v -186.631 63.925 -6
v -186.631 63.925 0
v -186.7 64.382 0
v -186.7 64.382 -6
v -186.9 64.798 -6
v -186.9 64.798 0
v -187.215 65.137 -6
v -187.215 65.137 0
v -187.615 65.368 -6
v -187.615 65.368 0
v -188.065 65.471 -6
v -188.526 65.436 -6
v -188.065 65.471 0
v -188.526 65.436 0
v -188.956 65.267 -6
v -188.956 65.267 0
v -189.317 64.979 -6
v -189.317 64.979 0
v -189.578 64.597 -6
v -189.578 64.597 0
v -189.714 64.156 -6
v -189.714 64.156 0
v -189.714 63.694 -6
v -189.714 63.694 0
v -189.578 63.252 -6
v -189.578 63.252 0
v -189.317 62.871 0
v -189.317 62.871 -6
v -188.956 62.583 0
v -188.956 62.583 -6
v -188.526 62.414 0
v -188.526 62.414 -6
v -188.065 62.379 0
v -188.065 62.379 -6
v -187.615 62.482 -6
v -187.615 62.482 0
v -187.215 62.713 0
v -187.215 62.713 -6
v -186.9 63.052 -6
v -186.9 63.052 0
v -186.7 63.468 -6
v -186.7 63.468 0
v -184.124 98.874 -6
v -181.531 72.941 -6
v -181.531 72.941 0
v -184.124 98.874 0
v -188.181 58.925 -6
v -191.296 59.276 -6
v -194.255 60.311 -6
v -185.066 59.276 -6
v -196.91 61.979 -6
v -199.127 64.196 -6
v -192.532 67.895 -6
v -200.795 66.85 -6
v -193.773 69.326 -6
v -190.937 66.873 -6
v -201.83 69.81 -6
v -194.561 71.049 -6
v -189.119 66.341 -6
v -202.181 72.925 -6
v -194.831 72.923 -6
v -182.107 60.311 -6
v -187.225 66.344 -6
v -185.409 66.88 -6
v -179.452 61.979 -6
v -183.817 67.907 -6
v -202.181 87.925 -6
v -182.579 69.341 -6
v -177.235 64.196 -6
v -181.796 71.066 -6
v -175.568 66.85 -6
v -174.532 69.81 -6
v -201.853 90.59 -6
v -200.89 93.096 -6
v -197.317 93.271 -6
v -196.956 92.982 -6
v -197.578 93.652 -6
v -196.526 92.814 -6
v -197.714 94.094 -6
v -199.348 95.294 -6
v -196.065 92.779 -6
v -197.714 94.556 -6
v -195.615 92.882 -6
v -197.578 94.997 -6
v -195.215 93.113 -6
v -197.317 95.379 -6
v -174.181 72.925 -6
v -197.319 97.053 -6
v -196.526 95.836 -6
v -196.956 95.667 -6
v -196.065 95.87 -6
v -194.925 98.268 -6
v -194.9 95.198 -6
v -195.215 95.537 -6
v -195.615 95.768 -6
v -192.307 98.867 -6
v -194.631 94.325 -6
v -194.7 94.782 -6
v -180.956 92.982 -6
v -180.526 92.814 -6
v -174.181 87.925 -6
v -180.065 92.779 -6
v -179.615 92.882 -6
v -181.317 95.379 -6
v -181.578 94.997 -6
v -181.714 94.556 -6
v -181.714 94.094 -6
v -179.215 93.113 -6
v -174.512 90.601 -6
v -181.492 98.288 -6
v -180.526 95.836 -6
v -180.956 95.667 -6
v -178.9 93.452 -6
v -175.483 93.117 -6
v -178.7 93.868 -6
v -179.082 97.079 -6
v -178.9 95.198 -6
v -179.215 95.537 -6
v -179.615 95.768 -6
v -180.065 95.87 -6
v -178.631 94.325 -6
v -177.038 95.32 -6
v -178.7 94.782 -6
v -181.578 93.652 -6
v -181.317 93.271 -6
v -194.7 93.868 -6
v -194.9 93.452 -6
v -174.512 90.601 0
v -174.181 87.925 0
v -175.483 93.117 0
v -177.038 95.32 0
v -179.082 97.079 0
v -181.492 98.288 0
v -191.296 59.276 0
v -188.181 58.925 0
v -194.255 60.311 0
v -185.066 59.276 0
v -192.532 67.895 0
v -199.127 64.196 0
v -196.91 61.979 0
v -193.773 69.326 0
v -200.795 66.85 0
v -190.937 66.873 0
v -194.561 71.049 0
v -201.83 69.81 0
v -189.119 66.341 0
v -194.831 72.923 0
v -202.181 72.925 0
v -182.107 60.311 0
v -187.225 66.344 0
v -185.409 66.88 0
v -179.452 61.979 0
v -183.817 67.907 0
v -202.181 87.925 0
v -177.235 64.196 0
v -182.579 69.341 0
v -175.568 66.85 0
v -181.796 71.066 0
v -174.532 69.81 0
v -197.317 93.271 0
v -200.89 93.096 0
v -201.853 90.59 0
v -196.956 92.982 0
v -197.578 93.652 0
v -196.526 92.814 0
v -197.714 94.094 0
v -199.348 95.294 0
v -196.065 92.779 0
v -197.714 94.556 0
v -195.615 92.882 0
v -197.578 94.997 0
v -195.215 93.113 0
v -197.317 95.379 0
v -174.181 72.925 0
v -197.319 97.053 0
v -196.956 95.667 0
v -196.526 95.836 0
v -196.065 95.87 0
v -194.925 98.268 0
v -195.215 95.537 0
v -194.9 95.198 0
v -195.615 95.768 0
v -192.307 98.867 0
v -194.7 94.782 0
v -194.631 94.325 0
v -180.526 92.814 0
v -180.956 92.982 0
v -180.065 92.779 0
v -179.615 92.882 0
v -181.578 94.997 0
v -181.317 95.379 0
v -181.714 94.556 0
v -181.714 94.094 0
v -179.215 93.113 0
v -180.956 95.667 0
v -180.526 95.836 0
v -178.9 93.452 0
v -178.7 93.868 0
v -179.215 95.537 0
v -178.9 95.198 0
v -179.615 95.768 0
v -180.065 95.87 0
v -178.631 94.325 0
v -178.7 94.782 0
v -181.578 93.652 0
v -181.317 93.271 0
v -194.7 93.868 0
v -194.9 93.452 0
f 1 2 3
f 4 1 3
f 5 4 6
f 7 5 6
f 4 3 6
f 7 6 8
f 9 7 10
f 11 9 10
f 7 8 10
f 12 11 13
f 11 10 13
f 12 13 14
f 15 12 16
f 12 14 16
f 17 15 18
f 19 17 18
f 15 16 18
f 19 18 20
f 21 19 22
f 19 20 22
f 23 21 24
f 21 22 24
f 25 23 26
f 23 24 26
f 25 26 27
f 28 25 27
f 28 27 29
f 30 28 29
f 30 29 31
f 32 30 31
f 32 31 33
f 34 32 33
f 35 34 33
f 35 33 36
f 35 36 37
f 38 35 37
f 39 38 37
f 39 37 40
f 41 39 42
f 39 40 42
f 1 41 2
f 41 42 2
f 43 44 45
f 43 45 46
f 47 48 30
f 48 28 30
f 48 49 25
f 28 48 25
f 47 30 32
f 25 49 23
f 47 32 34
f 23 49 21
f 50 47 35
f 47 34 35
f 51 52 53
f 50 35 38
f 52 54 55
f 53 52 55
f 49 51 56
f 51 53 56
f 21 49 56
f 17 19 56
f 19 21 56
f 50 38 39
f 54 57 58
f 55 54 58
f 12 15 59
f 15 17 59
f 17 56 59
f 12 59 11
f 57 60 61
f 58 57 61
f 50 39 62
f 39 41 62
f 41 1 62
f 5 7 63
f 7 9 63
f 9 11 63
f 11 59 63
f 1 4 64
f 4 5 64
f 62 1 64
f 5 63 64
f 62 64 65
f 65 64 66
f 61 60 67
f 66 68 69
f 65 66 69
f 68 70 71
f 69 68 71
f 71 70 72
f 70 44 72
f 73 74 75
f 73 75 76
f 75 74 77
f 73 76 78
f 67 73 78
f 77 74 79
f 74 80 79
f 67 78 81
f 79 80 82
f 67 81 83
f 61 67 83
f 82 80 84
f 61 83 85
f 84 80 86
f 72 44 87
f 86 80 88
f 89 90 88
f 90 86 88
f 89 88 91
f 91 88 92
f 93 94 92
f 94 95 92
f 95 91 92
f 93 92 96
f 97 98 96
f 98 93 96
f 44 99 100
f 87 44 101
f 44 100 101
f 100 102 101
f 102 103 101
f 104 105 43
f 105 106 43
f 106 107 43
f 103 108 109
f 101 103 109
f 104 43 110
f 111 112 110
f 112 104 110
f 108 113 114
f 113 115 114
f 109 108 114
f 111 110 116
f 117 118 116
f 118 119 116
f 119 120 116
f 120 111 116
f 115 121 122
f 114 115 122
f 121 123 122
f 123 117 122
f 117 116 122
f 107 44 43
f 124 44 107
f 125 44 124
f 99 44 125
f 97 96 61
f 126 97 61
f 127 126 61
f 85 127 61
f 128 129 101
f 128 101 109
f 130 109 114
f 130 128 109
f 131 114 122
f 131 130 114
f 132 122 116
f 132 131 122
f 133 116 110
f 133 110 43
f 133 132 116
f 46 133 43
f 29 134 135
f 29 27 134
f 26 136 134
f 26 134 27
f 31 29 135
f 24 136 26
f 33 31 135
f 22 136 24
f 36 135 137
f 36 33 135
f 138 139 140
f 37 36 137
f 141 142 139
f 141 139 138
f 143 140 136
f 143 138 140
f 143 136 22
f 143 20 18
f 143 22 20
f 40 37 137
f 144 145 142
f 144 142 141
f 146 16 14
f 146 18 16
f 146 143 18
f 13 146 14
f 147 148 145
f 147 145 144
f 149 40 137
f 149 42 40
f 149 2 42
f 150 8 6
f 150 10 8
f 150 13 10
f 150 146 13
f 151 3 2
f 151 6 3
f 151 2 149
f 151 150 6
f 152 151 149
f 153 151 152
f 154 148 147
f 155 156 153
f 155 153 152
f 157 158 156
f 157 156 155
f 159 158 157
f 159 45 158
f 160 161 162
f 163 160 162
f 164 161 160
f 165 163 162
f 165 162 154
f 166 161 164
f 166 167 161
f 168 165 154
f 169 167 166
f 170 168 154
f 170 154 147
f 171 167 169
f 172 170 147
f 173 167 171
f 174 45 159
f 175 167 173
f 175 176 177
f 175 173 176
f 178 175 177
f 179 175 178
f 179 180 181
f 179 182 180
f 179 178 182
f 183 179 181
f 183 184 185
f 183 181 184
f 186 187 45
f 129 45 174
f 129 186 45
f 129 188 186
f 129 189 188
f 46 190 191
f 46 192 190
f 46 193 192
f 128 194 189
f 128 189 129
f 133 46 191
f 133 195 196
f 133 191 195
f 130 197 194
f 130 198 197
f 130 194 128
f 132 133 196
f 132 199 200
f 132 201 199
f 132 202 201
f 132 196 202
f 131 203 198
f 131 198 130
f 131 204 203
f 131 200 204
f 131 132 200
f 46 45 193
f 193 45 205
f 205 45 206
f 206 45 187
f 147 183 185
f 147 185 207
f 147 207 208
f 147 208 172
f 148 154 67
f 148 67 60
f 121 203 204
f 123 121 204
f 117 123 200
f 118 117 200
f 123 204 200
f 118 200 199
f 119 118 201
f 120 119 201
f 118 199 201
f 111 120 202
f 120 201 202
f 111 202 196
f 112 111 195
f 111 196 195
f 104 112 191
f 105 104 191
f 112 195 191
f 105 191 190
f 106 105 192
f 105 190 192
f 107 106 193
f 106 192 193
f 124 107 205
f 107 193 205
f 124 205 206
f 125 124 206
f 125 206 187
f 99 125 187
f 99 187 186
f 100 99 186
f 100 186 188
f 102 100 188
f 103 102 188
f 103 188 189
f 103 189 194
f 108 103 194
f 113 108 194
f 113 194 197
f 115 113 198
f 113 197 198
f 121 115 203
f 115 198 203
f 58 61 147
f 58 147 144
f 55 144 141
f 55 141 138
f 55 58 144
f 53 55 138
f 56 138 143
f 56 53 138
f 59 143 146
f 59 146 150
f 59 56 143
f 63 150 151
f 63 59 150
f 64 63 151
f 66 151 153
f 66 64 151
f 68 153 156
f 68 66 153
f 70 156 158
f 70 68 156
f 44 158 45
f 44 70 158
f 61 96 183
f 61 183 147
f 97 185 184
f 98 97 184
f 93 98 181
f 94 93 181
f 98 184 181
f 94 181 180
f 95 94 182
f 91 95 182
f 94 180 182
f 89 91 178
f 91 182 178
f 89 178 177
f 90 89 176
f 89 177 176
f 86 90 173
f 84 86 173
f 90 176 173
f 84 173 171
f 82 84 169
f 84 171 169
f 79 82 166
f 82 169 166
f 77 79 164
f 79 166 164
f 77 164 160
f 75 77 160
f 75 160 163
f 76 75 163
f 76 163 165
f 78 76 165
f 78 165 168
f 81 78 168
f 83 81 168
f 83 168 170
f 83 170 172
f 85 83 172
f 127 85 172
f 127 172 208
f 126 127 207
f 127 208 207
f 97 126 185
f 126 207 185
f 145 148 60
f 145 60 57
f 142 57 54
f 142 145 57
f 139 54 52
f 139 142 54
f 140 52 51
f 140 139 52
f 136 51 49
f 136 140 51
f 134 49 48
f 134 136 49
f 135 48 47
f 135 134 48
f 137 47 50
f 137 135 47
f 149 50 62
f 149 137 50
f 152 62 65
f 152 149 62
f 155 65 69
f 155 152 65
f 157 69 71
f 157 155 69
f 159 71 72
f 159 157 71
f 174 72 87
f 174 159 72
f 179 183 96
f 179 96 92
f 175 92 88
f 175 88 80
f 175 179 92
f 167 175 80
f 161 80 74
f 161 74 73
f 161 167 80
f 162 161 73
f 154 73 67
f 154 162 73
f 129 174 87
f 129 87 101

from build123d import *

# Parameters (mm, degrees)
DODANIE_WYCI_GNI_CIE1_DEPTH = 6
SZKIC3_R                    = 1.55
WYTNIJ_WYCI_GNI_CIE2_DEPTH  = 6
SZKIC4_R                    = 1.55
WYTNIJ_WYCI_GNI_CIE3_DEPTH  = 6
WYTNIJ_WYCI_GNI_CIE4_DEPTH  = 6


with BuildPart() as part:
    # Szkic1 → Dodanie-wyciągnięcie1 (new body)
    with BuildSketch(Plane.XY):
        with BuildLine():
            Line((-174.181077779, 72.924846477), (-174.181077779, 87.924846477))
            ThreePointArc((-174.181077779, 87.924846477), (-177.402903186, 95.70302107), (-185.181077779, 98.924846477))
            Line((-185.181077779, 98.924846477), (-191.181077779, 98.924846477))
            ThreePointArc((-191.181077779, 98.924846477), (-198.959252372, 95.70302107), (-202.181077779, 87.924846477))
            Line((-202.181077779, 87.924846477), (-202.181077779, 72.924846477))
            ThreePointArc((-202.181077779, 72.924846477), (-188.181077779, 58.924846477), (-174.181077779, 72.924846477))
        make_face()
    extrude(amount=-DODANIE_WYCI_GNI_CIE1_DEPTH)

    # Szkic3 → Wytnij-wyciągnięcie2 (cut)
    with BuildSketch(Plane.XY):
        with Locations((-196.181077779, 94.324819795)):
            Circle(SZKIC3_R)
        with Locations((-180.181077779, 94.324819795)):
            Circle(SZKIC3_R)
        with Locations((-188.181077779, 63.924846477)):
            Circle(SZKIC3_R)
    extrude(amount=-WYTNIJ_WYCI_GNI_CIE2_DEPTH, mode=Mode.SUBTRACT)

    # Szkic4 → Wytnij-wyciągnięcie3 (cut)
    with BuildSketch(Plane.XY):
        with Locations((-188.181077779, 72.924846477)):
            Circle(SZKIC4_R)
    extrude(amount=-WYTNIJ_WYCI_GNI_CIE3_DEPTH, mode=Mode.SUBTRACT)

    # Szkic7 → Wytnij-wyciągnięcie4 (cut)
    with BuildSketch(Plane(origin=(0, 0, -6), x_dir=(-1, 0, 0), z_dir=(0, 0, -1))):
        with BuildLine():
            Line((181.531097956, 72.941227743), (184.470707897, 102.337327159))
            ThreePointArc((184.470707897, 102.337327159), (188.225739241, 106.074816392), (191.97068627, 102.327222776))
            Line((191.97068627, 102.327222776), (194.831077602, 72.923309279))
            ThreePointArc((194.831077602, 72.923309279), (188.172118542, 66.274852512), (181.531097956, 72.941227743))
        make_face()
    extrude(amount=-WYTNIJ_WYCI_GNI_CIE4_DEPTH, mode=Mode.SUBTRACT)


solid = part.part
